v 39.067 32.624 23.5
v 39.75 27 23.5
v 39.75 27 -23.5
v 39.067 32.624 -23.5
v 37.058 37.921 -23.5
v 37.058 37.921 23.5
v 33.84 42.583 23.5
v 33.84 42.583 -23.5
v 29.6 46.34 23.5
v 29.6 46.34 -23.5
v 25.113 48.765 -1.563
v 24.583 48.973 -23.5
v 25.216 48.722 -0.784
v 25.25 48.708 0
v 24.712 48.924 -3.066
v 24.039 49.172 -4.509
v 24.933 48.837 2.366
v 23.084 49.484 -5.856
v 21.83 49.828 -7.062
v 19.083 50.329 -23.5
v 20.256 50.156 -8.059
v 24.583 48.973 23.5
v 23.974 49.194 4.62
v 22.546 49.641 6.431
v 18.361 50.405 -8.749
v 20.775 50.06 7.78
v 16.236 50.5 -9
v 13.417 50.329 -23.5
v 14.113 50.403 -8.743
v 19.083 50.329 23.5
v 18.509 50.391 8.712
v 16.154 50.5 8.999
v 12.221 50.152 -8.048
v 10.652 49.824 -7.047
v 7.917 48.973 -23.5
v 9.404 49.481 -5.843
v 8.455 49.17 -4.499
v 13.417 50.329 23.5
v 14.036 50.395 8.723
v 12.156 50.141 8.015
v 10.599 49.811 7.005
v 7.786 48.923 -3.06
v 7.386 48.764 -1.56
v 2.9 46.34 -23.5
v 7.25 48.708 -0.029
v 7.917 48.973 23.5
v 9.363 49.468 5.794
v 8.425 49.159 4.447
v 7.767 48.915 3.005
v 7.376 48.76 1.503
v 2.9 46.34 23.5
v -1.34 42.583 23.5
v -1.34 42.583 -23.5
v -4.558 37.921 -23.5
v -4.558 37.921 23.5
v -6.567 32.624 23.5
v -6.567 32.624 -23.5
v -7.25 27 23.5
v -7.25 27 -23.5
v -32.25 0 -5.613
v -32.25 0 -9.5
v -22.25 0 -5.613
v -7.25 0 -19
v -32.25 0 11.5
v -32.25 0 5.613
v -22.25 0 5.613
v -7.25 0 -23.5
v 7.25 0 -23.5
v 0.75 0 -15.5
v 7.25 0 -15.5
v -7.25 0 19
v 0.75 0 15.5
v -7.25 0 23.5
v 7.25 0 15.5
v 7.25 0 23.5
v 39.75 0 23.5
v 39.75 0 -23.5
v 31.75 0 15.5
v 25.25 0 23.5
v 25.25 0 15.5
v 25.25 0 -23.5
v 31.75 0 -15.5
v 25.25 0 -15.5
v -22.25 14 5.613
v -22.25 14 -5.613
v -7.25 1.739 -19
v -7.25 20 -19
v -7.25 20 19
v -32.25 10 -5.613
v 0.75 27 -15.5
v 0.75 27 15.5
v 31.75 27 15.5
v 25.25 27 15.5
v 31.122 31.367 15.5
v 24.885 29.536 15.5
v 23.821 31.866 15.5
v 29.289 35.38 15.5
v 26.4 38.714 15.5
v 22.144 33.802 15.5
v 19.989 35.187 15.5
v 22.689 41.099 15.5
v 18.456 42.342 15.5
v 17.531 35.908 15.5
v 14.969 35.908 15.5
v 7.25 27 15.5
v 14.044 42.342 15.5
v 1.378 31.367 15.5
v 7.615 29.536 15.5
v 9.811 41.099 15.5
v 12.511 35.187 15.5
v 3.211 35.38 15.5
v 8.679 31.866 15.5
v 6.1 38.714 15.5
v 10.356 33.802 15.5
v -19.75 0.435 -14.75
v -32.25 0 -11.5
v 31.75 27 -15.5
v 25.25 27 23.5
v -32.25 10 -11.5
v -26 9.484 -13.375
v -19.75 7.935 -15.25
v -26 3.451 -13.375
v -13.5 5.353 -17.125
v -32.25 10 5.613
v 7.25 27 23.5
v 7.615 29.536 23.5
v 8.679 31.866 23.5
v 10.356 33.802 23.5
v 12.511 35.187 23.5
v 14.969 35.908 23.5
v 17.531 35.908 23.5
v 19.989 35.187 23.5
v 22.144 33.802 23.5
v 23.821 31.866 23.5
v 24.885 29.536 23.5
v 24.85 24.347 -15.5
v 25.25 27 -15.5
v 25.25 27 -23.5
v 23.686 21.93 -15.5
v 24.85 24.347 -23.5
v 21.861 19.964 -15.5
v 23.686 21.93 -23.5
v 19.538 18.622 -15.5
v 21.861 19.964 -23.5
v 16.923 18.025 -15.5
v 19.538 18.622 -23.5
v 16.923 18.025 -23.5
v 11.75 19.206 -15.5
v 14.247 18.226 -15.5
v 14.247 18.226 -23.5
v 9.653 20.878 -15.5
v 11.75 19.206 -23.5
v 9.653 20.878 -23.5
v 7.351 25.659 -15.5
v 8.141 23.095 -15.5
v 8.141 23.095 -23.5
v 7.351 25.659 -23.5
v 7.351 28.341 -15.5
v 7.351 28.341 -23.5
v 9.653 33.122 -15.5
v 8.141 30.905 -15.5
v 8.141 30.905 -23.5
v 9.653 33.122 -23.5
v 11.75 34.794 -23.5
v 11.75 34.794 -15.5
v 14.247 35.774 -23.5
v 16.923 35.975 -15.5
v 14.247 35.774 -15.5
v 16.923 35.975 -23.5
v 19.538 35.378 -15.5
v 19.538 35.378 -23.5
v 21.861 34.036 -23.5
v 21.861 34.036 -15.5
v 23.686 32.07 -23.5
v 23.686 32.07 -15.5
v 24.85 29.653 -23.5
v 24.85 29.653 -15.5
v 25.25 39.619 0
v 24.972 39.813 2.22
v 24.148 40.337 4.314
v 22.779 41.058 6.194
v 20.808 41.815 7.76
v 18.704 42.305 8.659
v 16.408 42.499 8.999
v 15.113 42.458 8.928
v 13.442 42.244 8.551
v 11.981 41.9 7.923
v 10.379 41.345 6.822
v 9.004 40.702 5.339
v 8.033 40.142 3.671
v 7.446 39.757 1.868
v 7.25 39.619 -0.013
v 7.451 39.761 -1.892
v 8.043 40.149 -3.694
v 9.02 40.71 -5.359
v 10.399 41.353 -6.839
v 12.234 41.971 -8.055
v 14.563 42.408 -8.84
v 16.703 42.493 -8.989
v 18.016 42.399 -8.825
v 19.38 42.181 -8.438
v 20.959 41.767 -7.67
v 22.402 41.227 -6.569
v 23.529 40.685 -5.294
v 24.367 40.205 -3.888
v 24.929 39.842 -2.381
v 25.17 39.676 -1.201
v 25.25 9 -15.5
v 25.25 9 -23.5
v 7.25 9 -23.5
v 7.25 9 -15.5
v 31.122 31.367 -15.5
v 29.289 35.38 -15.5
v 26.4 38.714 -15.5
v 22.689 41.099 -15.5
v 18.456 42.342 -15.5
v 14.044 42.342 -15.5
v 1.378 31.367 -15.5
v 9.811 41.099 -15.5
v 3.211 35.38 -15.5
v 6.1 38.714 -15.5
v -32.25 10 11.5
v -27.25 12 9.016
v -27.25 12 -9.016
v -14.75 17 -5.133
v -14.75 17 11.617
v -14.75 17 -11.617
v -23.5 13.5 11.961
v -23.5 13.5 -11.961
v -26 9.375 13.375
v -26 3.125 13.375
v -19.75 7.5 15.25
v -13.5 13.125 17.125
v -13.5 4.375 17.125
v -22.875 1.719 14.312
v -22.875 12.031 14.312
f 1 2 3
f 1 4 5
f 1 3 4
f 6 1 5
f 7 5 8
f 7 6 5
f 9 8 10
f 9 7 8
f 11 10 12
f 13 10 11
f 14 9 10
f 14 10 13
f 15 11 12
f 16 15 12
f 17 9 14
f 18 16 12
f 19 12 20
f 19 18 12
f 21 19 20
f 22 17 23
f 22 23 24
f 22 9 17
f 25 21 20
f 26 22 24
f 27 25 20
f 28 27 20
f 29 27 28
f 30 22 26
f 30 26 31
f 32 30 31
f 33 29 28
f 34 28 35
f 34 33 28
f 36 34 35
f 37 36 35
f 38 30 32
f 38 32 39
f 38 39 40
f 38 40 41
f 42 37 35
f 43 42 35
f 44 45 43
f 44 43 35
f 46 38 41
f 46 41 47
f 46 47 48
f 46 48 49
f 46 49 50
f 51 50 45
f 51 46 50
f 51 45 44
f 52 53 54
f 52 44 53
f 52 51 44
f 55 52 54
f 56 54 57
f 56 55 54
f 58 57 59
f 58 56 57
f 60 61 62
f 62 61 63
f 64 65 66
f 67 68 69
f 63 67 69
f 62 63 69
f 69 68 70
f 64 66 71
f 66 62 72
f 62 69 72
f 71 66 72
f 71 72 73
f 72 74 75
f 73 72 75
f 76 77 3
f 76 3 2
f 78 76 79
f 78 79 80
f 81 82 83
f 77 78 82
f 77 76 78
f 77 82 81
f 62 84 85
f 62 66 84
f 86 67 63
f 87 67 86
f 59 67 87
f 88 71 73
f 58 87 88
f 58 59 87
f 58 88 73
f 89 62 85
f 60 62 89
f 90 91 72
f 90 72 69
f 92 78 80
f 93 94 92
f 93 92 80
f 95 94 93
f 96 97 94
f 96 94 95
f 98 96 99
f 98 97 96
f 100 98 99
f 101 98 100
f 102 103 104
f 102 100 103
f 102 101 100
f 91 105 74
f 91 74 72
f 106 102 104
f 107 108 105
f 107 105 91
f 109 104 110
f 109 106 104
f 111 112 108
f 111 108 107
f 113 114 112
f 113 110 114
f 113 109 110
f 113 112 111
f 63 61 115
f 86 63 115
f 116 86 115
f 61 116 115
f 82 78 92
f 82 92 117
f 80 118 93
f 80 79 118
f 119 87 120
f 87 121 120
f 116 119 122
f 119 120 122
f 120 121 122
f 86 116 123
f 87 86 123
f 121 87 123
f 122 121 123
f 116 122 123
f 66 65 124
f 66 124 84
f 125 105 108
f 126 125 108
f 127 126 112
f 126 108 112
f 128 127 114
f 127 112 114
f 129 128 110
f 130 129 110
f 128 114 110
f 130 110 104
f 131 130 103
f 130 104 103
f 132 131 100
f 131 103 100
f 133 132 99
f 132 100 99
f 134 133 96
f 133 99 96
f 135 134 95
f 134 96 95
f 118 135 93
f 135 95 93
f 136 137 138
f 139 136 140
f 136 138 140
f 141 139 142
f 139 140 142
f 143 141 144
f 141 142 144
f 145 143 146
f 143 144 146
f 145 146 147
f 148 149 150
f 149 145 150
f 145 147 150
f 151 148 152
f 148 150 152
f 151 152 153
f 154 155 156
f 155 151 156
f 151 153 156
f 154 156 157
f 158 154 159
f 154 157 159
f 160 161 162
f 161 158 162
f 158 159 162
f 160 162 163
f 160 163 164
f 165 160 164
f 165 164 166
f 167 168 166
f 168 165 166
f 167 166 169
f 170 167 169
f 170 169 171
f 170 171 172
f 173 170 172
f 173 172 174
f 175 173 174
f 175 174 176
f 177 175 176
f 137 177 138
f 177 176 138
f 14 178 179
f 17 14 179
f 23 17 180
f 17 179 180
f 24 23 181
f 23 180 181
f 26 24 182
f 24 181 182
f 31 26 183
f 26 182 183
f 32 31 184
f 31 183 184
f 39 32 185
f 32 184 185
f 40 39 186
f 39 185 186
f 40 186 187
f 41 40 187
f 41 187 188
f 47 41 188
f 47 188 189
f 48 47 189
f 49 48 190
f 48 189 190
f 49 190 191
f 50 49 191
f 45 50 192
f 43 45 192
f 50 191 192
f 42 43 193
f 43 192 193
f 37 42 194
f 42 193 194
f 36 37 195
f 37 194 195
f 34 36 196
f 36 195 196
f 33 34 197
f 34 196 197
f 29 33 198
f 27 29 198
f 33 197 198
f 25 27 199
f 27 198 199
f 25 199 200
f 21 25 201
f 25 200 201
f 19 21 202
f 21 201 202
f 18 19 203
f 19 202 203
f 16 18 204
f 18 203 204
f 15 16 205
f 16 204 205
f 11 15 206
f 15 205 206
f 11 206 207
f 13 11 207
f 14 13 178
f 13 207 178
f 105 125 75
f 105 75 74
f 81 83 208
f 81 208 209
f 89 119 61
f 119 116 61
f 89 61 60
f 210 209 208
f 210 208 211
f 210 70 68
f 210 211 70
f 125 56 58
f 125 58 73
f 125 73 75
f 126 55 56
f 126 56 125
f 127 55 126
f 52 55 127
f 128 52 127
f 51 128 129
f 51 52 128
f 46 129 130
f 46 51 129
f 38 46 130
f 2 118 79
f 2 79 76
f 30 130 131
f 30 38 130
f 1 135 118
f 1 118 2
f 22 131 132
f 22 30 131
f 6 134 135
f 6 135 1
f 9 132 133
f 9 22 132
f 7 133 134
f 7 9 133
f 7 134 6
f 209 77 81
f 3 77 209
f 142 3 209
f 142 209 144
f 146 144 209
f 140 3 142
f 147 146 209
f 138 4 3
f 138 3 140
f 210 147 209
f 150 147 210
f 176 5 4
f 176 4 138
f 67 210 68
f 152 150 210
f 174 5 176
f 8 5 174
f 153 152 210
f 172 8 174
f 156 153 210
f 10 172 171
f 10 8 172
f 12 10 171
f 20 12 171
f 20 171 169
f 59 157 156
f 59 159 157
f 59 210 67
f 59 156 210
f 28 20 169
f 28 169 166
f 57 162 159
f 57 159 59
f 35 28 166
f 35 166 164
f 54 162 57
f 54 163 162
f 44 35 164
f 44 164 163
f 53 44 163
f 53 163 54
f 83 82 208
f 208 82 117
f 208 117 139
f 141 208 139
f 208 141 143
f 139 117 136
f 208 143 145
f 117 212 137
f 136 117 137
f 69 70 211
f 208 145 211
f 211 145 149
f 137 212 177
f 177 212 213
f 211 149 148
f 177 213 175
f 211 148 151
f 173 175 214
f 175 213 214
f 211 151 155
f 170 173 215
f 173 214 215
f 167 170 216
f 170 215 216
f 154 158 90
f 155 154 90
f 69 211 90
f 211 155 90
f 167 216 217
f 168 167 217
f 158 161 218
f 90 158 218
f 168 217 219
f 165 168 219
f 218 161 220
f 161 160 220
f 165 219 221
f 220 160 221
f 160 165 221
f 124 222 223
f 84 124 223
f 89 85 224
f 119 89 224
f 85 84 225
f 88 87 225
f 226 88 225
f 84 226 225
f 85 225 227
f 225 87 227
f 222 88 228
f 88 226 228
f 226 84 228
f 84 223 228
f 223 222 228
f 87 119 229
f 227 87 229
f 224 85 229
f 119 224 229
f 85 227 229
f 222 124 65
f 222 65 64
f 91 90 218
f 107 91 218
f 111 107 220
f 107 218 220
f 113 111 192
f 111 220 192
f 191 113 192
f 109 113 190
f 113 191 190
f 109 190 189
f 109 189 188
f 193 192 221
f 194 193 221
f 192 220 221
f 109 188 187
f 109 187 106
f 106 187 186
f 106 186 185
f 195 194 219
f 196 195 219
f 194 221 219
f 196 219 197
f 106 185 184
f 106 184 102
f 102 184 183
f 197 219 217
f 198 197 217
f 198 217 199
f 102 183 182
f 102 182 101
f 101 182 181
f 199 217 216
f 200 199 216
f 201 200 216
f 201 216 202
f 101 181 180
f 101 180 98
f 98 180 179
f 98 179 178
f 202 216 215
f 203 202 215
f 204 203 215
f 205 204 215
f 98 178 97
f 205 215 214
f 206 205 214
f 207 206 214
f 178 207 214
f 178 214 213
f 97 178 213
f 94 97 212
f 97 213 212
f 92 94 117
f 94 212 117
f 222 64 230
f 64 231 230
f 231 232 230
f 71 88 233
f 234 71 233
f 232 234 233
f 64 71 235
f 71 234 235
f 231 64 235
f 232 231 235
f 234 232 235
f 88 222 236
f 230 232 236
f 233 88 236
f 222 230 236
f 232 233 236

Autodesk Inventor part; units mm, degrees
ref_plane "XZ Plane" through (0, 0, 0) normal (0, 1, 0) x (-1, 0, 0)
ref_plane "XY Plane" through (0, 0, 0) normal (0, 0, 1) x (1, 0, 0)
sketch "草图1" plane through (0, 0, 0) normal (0, 1, 0) x (-1, 0, 0)
  line L0 (234.2186, 0) -> (-293.6058, 0)
  line L1 (7.25, 23.5) -> (-7.25, 23.5)
  line L2 (-7.25, -23.5) -> (7.25, -23.5)
  line L3 (7.25, -23.5) -> (7.25, 23.5)
  line L4 (7.25, 23.5) -> (-7.25, -23.5) construction
  line L5 (-7.25, 23.5) -> (7.25, -23.5) construction
  line L6 (-7.25, 15.5) -> (-0.75, 15.5)
  line L7 (-0.75, 15.5) -> (-0.75, -15.5)
  line L8 (-0.75, -15.5) -> (-7.25, -15.5)
  line L9 (-13.75, 15.5) -> (-0.75, -15.5) construction
  line L10 (-0.75, 15.5) -> (-13.75, -15.5) construction
  line L11 (-7.25, 23.5) -> (-7.25, 15.5)
  line L12 (-7.25, -15.5) -> (-7.25, -23.5)
  point P0 (0, 0)
  point P1 (-7.25, 0)
  dimension "d0" = 14.5
  dimension "d1" = 47
  dimension "d2" = 13
sketch "草图2" plane through (0, 0, 0) normal (0, 1, 0) x (-1, 0, 0)
  point P0 (0, 0)
sketch "草图3" plane through (0, 0, 0) normal (0, 0, 1) x (1, 0, 0)
  line L0 (0, 0) -> (0, 27)
  arc A0 (32.5, 27) -> (0, 27) centre (16.25, 27) ccw
  line L1 (32.5, 27) -> (32.5, 0)
  dimension "d4" = 27
  dimension "d5" = 32.5
sweep "扫掠1" add profiles "草图1" path "草图3"
sketch "草图4" plane through (7.25, 0, -23.5) normal (0, 0, -1) x (-1, 0, 0)
  line L0 (-18, 27) -> (-18, 0) projected
  arc A0 (0, 27) -> (-18, 27) centre (-9, 27) ccw projected
  line L1 (0, 0) -> (0, 27) projected
  arc A1 (-18, 27) -> (0, 27) centre (-9, 27) ccw
  line L2 (-18, 9) -> (0, 9)
  line L3 (-18, 9) -> (-18, 27)
  line L4 (0, 9) -> (0, 27)
  point P0 (7.25, 0)
  dimension "d7" = 18
extrude "拉伸1" add sketch "草图4" against normal blind 8 contours A1 L1 L2 L0
sketch "草图5" plane through (-7.25, 0, 23.5) normal (0, -1, 0) x (1, 0, 0)
  line L0 (0, 0) -> (14.5, 0) projected
  line L1 (0, -47) -> (0, 0) projected
  line L2 (14.5, -47) -> (0, -47) projected
  line L3 (14.5, -39) -> (14.5, -47) projected
  line L4 (8, -39) -> (14.5, -39) projected
  line L5 (8, -8) -> (8, -39) projected
  line L6 (14.5, -8) -> (8, -8) projected
  line L7 (14.5, 0) -> (14.5, -8) projected
  point P0 (7.25, -23.5)
sketch "草图6" plane through (25.25, 0, 23.5) normal (0, -1, 0) x (1, 0, 0)
  line L0 (14.5, 0) -> (0, 0) projected
  line L1 (0, 0) -> (0, -8) projected
  line L2 (0, -8) -> (6.5, -8) projected
  line L3 (6.5, -8) -> (6.5, -39) projected
  line L4 (6.5, -39) -> (0, -39) projected
  line L5 (0, -39) -> (0, -47) projected
  line L6 (0, -47) -> (14.5, -47) projected
  line L7 (14.5, -47) -> (14.5, 0) projected
  point P0 (-25.25, -23.5)
sketch "草图7" plane through (-7.25, 0, 23.5) normal (0, -1, 0) x (1, 0, 0)
  line L0 (0, 0) -> (14.5, 0) projected
  line L1 (0, -47) -> (0, 0) projected
  line L2 (14.5, -47) -> (0, -47) projected
  line L3 (14.5, -39) -> (14.5, -47) projected
  line L4 (8, -39) -> (14.5, -39) projected
  line L5 (8, -8) -> (8, -39) projected
  line L6 (14.5, -8) -> (8, -8)
  line L7 (14.5, 0) -> (14.5, -8) projected
  point P0 (7.25, -23.5)
  dimension "d10" = 6.5
sketch "草图8" plane through (-7.25, 0, 23.5) normal (0, -1, 0) x (1, 0, 0)
  line L0 (8, -8) -> (8, -39) projected
  circle A0 centre (23.5, -23.5) radius 9
  point P0 (7.25, -23.5)
  dimension "d11" = 18
  dimension "d12" = 15.5
extrude "拉伸2" cut sketch "草图8" against normal blind 232
sketch "草图9" plane through (-7.25, 0, -23.5) normal (-1, 0, 0) x (0, 0, 1)
  line L0 (42.5, 0) -> (4.5, 0)
  line L1 (4.5, 0) -> (4.5, 20)
  line L2 (4.5, 20) -> (42.5, 20)
  line L3 (42.5, 20) -> (42.5, 0)
  line L4 (42.5, 0) -> (4.5, 20) construction
  line L5 (4.5, 0) -> (42.5, 20) construction
  line L6 (47, 0) -> (39, 0) projected
  point P0 (23.5, 0)
  point P1 (23.5, 10)
  point P2 (43, 0)
  dimension "d15" = 38
  dimension "d16" = 20
ref_plane "工作平面1" through (-3.625, 0, 0) normal (1, 0, 0) x (0, 1, 0)
ref_plane "工作平面2" through (-32.25, 0, -23.5) normal (-1, 0, 0) x (0, 0, 1)
sketch "草图10" plane through (-32.25, 0, -23.5) normal (-1, 0, 0) x (0, 0, 1)
  line L0 (12, 0) -> (35, 0)
  line L1 (35, 0) -> (35, 10)
  line L2 (35, 10) -> (12, 10)
  line L3 (12, 10) -> (12, 0)
  line L4 (12, 0) -> (35, 10) construction
  line L5 (35, 0) -> (12, 10) construction
  point P0 (23.5, 0)
  point P1 (23.5, 5)
  point P2 (39, 0)
  dimension "d18" = 23
  dimension "d19" = 10
loft "放样1" add profiles "草图10", "草图9"
sketch "草图11" plane through (-32.25, 0, 11.5) normal (-1, 0, 0) x (0, 0, 1)
  line L0 (-23, 0) -> (0, 0) projected
  line L1 (0, 0) -> (0, 10) projected
  line L2 (0, 10) -> (-23, 10) projected
  line L3 (-23, 10) -> (-23, 0) projected
  point P0 (-11.5, 0)
sketch "草图12" plane through (-7.25, 0, 23.5) normal (0, -1, 0) x (1, 0, 0)
  line L0 (-25, -35) -> (-25, -12) projected
  line L1 (-15, -29.113) -> (-25, -29.113)
  line L2 (-25, -29.113) -> (-25, -17.887)
  line L3 (-25, -17.887) -> (-15, -17.887)
  line L4 (-15, -17.887) -> (-15, -29.113)
  line L5 (-15, -29.113) -> (-25, -17.887) construction
  line L6 (-25, -29.113) -> (-15, -17.887) construction
  point P0 (7.25, -23.5)
  point P1 (-20, -23.5)
  point P2 (-25, -23.5)
  dimension "d24" = 10
extrude "拉伸3" cut sketch "草图12" against normal blind 232
equation "\"折弯半径\" = 厚度"
equation "\"折弯释压宽度\" = 厚度"
equation "\"折弯释压深度\" = 0.5 * 厚度"
equation "\"拐角释压尺寸\" = 4 * 厚度"
equation "\"最小余量\" = 2 * 厚度"
equation "\"过渡半径\" = 折弯半径"
equation "\"Jacobi半径尺寸\" = 厚度"
equation "\"间隙大小\" = 厚度"
equation "\"厚度\" = 0.5"
